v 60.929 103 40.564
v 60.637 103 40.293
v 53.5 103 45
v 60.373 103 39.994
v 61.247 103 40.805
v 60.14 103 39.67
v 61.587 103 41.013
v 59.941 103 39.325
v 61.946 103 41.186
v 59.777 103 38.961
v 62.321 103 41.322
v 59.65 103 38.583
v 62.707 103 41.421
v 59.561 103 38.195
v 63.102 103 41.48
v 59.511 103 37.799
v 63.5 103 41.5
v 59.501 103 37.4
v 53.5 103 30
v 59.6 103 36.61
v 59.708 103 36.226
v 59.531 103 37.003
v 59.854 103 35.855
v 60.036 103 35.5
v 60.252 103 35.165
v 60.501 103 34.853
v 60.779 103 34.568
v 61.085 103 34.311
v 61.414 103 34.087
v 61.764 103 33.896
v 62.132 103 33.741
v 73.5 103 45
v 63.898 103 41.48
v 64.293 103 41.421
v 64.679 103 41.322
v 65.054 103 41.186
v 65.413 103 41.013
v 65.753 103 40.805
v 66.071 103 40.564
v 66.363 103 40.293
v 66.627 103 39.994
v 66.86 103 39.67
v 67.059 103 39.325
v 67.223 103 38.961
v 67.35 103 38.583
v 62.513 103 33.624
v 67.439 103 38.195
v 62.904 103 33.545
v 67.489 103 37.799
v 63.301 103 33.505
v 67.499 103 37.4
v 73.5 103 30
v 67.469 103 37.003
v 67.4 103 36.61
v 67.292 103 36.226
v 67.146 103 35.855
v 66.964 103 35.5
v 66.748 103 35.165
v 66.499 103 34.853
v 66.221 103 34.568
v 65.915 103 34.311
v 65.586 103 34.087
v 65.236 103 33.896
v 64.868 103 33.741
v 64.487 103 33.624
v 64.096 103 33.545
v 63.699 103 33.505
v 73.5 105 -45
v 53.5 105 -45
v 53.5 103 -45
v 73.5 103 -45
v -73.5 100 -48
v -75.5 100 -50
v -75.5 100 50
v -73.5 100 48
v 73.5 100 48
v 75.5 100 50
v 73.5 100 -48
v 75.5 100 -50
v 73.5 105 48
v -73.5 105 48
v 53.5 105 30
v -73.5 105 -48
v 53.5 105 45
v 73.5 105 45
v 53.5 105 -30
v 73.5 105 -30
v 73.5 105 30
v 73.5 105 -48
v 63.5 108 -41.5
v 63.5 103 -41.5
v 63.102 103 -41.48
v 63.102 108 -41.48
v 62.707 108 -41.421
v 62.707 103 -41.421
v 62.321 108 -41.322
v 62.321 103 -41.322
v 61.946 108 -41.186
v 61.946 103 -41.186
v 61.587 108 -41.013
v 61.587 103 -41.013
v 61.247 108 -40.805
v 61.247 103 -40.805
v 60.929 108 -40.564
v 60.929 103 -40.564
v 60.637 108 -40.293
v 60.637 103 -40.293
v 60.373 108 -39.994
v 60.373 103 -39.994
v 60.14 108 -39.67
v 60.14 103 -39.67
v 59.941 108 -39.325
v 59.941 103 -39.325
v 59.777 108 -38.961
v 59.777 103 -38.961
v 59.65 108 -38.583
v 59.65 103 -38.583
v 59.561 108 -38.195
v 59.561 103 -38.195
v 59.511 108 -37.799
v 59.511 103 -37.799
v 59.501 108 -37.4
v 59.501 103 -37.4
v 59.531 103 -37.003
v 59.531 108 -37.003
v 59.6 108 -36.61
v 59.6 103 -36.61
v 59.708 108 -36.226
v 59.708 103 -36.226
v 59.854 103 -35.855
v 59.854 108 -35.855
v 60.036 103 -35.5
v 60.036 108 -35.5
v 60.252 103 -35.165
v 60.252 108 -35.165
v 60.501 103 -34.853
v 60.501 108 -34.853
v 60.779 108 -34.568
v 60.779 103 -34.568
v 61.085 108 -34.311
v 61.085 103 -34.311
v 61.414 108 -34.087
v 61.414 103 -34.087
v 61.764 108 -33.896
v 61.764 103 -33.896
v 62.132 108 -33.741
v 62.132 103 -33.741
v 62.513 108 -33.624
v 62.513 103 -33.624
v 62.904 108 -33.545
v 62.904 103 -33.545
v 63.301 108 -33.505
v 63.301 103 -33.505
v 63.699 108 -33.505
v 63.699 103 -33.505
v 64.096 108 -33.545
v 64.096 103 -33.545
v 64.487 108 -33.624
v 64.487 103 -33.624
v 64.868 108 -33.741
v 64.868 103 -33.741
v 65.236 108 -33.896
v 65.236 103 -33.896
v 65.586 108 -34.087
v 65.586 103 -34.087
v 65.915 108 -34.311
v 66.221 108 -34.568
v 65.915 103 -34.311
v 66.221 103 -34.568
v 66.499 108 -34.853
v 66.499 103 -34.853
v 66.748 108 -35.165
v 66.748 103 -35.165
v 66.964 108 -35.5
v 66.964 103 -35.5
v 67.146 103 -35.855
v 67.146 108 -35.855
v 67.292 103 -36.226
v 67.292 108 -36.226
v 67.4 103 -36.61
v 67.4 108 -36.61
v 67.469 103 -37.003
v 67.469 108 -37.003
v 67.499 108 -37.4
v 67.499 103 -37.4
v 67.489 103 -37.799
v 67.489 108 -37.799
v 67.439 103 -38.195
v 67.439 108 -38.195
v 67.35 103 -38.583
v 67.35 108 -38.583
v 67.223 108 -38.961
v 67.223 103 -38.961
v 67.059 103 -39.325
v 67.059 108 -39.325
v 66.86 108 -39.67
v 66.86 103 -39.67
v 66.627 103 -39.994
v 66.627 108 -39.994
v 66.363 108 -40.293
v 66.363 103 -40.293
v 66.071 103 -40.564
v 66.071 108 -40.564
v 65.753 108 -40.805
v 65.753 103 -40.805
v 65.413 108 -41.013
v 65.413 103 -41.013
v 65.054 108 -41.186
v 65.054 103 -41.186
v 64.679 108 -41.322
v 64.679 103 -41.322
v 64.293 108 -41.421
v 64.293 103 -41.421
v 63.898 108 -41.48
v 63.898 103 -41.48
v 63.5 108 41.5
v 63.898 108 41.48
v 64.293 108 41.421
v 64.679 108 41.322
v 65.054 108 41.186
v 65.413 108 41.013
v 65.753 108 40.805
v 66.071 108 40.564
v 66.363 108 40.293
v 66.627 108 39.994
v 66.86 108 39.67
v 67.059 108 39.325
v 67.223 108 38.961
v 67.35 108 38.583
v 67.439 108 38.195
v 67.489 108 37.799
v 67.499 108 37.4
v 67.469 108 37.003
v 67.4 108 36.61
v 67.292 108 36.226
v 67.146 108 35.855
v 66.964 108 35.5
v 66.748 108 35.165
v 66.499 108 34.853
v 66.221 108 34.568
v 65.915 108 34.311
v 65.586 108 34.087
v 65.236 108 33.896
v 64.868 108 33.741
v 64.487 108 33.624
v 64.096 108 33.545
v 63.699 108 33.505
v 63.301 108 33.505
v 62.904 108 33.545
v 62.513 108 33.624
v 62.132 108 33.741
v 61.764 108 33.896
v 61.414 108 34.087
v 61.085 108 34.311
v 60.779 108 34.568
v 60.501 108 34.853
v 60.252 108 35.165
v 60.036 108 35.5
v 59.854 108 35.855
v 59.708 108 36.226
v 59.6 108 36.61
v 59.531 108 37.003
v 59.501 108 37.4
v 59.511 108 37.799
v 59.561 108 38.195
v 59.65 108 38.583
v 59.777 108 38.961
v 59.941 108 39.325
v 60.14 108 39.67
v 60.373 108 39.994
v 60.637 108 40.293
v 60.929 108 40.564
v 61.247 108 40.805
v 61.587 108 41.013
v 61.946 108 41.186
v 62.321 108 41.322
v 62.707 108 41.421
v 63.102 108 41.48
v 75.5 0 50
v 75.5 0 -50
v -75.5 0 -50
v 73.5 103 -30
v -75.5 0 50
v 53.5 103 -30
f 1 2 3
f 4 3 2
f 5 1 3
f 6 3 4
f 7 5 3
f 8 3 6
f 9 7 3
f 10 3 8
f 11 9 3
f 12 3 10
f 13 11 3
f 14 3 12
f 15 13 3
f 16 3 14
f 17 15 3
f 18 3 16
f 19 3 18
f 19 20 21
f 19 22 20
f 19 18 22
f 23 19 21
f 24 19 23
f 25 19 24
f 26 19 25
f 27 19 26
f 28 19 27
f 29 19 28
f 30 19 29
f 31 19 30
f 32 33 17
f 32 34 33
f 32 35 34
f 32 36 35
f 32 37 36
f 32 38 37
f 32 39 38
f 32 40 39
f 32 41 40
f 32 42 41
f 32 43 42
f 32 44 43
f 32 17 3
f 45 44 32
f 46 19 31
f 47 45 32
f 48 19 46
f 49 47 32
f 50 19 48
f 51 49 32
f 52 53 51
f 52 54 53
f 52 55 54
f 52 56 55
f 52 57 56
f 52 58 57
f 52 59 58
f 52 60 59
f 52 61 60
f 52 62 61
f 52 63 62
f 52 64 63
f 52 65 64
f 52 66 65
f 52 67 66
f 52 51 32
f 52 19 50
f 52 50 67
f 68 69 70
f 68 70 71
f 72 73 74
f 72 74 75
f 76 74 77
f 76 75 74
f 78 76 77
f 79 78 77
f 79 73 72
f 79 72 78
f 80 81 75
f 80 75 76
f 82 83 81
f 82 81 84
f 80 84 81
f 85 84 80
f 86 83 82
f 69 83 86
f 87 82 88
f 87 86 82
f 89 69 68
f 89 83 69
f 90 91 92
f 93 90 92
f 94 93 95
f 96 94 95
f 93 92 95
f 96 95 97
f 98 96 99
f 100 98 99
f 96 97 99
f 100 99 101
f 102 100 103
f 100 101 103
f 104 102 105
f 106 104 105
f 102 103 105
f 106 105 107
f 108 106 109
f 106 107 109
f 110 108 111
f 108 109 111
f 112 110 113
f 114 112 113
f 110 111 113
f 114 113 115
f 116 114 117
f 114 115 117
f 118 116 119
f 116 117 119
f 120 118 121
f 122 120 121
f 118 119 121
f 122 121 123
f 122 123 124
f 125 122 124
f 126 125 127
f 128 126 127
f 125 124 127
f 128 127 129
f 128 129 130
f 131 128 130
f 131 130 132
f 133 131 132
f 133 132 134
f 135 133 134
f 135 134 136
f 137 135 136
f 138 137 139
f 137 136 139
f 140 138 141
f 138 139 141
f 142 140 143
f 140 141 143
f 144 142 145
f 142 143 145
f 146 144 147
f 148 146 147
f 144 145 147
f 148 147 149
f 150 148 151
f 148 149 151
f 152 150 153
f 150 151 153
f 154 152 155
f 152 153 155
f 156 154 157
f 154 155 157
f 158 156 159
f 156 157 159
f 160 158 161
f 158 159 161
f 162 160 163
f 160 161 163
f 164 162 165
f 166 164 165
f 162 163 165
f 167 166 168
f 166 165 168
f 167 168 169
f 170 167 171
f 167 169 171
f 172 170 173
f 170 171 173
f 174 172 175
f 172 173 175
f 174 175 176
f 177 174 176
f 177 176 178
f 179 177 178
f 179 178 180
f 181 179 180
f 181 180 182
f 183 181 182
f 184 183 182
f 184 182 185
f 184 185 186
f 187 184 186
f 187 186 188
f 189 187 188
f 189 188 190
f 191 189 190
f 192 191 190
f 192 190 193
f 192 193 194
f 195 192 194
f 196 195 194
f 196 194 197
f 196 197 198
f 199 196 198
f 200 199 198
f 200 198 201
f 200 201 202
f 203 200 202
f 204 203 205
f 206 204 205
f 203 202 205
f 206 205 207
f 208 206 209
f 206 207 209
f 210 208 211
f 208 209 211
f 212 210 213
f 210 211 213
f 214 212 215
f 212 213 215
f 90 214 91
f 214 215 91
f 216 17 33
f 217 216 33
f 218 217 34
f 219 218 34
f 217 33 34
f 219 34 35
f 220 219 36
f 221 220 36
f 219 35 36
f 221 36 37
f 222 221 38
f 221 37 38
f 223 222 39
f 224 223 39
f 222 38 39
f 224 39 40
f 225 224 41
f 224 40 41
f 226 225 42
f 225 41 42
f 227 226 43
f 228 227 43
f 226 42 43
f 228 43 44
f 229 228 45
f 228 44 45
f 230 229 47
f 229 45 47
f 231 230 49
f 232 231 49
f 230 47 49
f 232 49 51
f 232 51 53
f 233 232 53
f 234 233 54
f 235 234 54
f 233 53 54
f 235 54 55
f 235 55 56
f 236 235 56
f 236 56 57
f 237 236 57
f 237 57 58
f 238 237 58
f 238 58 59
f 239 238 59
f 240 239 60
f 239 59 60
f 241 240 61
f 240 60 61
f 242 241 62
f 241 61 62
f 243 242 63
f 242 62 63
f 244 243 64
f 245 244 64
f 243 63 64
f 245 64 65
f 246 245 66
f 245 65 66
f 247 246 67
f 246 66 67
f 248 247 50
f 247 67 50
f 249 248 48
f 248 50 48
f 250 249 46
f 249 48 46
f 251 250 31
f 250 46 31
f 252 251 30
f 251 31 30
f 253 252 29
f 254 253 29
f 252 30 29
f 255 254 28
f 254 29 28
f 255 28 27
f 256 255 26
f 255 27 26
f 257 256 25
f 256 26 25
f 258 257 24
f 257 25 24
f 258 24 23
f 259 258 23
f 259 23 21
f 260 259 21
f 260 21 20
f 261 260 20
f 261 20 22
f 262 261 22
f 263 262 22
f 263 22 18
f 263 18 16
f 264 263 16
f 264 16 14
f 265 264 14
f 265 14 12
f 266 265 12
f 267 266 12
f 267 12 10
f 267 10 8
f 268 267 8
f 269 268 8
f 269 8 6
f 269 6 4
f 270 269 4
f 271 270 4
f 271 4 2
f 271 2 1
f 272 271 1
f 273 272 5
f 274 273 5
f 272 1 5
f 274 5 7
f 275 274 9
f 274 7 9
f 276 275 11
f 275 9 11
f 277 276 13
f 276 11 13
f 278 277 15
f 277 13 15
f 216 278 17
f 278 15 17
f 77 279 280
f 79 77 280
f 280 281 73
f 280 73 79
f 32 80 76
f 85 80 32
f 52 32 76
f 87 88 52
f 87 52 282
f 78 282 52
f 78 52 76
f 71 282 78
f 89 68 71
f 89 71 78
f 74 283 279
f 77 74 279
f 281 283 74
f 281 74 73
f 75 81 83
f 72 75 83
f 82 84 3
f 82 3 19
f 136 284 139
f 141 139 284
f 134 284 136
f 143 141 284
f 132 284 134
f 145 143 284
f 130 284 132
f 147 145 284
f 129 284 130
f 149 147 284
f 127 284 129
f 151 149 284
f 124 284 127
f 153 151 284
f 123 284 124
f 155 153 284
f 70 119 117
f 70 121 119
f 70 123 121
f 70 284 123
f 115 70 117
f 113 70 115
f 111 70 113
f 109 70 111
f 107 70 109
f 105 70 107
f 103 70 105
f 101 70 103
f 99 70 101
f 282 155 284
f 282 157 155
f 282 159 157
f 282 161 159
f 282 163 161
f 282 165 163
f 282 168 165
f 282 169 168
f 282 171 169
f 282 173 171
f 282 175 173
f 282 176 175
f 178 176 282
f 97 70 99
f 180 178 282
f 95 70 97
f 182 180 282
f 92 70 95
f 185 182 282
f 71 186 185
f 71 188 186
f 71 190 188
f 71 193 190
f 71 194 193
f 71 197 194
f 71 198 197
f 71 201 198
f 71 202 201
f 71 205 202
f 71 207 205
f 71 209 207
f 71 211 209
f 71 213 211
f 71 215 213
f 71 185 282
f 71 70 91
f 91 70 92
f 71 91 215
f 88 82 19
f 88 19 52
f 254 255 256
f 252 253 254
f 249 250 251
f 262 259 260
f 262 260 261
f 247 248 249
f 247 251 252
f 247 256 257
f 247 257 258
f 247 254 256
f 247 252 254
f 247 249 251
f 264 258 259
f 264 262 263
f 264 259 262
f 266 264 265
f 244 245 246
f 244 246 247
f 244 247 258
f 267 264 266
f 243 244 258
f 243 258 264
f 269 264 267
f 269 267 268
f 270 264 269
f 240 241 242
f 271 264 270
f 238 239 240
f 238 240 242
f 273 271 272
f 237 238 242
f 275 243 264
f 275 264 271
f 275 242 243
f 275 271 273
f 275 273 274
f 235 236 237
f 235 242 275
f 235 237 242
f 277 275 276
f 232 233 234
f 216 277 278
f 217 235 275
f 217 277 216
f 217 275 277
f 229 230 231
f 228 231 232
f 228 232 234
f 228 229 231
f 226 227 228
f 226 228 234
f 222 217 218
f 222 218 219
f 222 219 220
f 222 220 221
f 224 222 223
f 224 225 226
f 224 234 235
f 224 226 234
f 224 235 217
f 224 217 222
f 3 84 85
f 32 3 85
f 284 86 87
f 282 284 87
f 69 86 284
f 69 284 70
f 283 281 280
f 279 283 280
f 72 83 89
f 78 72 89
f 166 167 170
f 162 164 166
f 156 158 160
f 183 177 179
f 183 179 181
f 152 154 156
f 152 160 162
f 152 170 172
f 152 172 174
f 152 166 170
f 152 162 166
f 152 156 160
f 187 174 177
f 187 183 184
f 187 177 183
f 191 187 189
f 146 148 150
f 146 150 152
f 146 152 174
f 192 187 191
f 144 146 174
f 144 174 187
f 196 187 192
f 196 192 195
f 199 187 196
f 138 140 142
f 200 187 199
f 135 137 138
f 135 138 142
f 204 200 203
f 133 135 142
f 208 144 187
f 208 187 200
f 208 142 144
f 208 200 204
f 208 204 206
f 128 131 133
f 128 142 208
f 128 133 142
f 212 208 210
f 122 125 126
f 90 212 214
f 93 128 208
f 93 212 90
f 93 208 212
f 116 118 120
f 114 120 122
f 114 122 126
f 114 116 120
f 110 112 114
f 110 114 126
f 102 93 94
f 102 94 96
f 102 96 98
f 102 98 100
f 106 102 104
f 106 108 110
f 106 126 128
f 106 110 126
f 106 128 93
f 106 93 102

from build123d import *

# Parameters (mm, degrees)
SKETCH1_W           = 151
SKETCH1_H           = 100
BOSS_EXTRUDE1_DEPTH = 105
SKETCH2_W           = 151
SKETCH2_H           = 100
SKETCH2_W_2         = 147
SKETCH2_H_2         = 96
CUT_EXTRUDE1_DEPTH  = 5
SKETCH3_W           = 20
SKETCH3_H           = 15
CUT_EXTRUDE2_DEPTH  = 2
SKETCH4_R           = 4
BOSS_EXTRUDE2_DEPTH = 5


with BuildPart() as part:
    # Sketch1 → Boss-Extrude1 (new body)
    with BuildSketch(Plane(origin=(0, 0, 0), x_dir=(1, 0, 0), z_dir=(0, 1, 0))):
        Rectangle(SKETCH1_W, SKETCH1_H)
    extrude(amount=BOSS_EXTRUDE1_DEPTH)

    # Sketch2 → Cut-Extrude1 (cut)
    with BuildSketch(Plane(origin=(0, 105, 0), x_dir=(1, 0, 0), z_dir=(0, 1, 0))):
        Rectangle(SKETCH2_W, SKETCH2_H)
        Rectangle(SKETCH2_W_2, SKETCH2_H_2, mode=Mode.SUBTRACT)
    extrude(amount=-CUT_EXTRUDE1_DEPTH, mode=Mode.SUBTRACT)

    # Sketch3 → Cut-Extrude2 (cut)
    with BuildSketch(Plane(origin=(0, 105, 0), x_dir=(1, 0, 0), z_dir=(0, 1, 0))):
        with Locations((63.5, 37.5)):
            Rectangle(SKETCH3_W, SKETCH3_H)
        with Locations((63.5, -37.5)):
            Rectangle(SKETCH3_W, SKETCH3_H)
    extrude(amount=-CUT_EXTRUDE2_DEPTH, mode=Mode.SUBTRACT)

    # Sketch4 → Boss-Extrude2 (add)
    with BuildSketch(Plane(origin=(0, 103, 0), x_dir=(1, 0, 0), z_dir=(0, 1, 0))):
        with Locations(Location((63.5, -37.5, 0), (0, 0, 270))):
            Circle(SKETCH4_R)
        with Locations(Location((63.5, 37.5, 0), (0, 0, 90))):
            Circle(SKETCH4_R)
    extrude(amount=BOSS_EXTRUDE2_DEPTH)


solid = part.part
